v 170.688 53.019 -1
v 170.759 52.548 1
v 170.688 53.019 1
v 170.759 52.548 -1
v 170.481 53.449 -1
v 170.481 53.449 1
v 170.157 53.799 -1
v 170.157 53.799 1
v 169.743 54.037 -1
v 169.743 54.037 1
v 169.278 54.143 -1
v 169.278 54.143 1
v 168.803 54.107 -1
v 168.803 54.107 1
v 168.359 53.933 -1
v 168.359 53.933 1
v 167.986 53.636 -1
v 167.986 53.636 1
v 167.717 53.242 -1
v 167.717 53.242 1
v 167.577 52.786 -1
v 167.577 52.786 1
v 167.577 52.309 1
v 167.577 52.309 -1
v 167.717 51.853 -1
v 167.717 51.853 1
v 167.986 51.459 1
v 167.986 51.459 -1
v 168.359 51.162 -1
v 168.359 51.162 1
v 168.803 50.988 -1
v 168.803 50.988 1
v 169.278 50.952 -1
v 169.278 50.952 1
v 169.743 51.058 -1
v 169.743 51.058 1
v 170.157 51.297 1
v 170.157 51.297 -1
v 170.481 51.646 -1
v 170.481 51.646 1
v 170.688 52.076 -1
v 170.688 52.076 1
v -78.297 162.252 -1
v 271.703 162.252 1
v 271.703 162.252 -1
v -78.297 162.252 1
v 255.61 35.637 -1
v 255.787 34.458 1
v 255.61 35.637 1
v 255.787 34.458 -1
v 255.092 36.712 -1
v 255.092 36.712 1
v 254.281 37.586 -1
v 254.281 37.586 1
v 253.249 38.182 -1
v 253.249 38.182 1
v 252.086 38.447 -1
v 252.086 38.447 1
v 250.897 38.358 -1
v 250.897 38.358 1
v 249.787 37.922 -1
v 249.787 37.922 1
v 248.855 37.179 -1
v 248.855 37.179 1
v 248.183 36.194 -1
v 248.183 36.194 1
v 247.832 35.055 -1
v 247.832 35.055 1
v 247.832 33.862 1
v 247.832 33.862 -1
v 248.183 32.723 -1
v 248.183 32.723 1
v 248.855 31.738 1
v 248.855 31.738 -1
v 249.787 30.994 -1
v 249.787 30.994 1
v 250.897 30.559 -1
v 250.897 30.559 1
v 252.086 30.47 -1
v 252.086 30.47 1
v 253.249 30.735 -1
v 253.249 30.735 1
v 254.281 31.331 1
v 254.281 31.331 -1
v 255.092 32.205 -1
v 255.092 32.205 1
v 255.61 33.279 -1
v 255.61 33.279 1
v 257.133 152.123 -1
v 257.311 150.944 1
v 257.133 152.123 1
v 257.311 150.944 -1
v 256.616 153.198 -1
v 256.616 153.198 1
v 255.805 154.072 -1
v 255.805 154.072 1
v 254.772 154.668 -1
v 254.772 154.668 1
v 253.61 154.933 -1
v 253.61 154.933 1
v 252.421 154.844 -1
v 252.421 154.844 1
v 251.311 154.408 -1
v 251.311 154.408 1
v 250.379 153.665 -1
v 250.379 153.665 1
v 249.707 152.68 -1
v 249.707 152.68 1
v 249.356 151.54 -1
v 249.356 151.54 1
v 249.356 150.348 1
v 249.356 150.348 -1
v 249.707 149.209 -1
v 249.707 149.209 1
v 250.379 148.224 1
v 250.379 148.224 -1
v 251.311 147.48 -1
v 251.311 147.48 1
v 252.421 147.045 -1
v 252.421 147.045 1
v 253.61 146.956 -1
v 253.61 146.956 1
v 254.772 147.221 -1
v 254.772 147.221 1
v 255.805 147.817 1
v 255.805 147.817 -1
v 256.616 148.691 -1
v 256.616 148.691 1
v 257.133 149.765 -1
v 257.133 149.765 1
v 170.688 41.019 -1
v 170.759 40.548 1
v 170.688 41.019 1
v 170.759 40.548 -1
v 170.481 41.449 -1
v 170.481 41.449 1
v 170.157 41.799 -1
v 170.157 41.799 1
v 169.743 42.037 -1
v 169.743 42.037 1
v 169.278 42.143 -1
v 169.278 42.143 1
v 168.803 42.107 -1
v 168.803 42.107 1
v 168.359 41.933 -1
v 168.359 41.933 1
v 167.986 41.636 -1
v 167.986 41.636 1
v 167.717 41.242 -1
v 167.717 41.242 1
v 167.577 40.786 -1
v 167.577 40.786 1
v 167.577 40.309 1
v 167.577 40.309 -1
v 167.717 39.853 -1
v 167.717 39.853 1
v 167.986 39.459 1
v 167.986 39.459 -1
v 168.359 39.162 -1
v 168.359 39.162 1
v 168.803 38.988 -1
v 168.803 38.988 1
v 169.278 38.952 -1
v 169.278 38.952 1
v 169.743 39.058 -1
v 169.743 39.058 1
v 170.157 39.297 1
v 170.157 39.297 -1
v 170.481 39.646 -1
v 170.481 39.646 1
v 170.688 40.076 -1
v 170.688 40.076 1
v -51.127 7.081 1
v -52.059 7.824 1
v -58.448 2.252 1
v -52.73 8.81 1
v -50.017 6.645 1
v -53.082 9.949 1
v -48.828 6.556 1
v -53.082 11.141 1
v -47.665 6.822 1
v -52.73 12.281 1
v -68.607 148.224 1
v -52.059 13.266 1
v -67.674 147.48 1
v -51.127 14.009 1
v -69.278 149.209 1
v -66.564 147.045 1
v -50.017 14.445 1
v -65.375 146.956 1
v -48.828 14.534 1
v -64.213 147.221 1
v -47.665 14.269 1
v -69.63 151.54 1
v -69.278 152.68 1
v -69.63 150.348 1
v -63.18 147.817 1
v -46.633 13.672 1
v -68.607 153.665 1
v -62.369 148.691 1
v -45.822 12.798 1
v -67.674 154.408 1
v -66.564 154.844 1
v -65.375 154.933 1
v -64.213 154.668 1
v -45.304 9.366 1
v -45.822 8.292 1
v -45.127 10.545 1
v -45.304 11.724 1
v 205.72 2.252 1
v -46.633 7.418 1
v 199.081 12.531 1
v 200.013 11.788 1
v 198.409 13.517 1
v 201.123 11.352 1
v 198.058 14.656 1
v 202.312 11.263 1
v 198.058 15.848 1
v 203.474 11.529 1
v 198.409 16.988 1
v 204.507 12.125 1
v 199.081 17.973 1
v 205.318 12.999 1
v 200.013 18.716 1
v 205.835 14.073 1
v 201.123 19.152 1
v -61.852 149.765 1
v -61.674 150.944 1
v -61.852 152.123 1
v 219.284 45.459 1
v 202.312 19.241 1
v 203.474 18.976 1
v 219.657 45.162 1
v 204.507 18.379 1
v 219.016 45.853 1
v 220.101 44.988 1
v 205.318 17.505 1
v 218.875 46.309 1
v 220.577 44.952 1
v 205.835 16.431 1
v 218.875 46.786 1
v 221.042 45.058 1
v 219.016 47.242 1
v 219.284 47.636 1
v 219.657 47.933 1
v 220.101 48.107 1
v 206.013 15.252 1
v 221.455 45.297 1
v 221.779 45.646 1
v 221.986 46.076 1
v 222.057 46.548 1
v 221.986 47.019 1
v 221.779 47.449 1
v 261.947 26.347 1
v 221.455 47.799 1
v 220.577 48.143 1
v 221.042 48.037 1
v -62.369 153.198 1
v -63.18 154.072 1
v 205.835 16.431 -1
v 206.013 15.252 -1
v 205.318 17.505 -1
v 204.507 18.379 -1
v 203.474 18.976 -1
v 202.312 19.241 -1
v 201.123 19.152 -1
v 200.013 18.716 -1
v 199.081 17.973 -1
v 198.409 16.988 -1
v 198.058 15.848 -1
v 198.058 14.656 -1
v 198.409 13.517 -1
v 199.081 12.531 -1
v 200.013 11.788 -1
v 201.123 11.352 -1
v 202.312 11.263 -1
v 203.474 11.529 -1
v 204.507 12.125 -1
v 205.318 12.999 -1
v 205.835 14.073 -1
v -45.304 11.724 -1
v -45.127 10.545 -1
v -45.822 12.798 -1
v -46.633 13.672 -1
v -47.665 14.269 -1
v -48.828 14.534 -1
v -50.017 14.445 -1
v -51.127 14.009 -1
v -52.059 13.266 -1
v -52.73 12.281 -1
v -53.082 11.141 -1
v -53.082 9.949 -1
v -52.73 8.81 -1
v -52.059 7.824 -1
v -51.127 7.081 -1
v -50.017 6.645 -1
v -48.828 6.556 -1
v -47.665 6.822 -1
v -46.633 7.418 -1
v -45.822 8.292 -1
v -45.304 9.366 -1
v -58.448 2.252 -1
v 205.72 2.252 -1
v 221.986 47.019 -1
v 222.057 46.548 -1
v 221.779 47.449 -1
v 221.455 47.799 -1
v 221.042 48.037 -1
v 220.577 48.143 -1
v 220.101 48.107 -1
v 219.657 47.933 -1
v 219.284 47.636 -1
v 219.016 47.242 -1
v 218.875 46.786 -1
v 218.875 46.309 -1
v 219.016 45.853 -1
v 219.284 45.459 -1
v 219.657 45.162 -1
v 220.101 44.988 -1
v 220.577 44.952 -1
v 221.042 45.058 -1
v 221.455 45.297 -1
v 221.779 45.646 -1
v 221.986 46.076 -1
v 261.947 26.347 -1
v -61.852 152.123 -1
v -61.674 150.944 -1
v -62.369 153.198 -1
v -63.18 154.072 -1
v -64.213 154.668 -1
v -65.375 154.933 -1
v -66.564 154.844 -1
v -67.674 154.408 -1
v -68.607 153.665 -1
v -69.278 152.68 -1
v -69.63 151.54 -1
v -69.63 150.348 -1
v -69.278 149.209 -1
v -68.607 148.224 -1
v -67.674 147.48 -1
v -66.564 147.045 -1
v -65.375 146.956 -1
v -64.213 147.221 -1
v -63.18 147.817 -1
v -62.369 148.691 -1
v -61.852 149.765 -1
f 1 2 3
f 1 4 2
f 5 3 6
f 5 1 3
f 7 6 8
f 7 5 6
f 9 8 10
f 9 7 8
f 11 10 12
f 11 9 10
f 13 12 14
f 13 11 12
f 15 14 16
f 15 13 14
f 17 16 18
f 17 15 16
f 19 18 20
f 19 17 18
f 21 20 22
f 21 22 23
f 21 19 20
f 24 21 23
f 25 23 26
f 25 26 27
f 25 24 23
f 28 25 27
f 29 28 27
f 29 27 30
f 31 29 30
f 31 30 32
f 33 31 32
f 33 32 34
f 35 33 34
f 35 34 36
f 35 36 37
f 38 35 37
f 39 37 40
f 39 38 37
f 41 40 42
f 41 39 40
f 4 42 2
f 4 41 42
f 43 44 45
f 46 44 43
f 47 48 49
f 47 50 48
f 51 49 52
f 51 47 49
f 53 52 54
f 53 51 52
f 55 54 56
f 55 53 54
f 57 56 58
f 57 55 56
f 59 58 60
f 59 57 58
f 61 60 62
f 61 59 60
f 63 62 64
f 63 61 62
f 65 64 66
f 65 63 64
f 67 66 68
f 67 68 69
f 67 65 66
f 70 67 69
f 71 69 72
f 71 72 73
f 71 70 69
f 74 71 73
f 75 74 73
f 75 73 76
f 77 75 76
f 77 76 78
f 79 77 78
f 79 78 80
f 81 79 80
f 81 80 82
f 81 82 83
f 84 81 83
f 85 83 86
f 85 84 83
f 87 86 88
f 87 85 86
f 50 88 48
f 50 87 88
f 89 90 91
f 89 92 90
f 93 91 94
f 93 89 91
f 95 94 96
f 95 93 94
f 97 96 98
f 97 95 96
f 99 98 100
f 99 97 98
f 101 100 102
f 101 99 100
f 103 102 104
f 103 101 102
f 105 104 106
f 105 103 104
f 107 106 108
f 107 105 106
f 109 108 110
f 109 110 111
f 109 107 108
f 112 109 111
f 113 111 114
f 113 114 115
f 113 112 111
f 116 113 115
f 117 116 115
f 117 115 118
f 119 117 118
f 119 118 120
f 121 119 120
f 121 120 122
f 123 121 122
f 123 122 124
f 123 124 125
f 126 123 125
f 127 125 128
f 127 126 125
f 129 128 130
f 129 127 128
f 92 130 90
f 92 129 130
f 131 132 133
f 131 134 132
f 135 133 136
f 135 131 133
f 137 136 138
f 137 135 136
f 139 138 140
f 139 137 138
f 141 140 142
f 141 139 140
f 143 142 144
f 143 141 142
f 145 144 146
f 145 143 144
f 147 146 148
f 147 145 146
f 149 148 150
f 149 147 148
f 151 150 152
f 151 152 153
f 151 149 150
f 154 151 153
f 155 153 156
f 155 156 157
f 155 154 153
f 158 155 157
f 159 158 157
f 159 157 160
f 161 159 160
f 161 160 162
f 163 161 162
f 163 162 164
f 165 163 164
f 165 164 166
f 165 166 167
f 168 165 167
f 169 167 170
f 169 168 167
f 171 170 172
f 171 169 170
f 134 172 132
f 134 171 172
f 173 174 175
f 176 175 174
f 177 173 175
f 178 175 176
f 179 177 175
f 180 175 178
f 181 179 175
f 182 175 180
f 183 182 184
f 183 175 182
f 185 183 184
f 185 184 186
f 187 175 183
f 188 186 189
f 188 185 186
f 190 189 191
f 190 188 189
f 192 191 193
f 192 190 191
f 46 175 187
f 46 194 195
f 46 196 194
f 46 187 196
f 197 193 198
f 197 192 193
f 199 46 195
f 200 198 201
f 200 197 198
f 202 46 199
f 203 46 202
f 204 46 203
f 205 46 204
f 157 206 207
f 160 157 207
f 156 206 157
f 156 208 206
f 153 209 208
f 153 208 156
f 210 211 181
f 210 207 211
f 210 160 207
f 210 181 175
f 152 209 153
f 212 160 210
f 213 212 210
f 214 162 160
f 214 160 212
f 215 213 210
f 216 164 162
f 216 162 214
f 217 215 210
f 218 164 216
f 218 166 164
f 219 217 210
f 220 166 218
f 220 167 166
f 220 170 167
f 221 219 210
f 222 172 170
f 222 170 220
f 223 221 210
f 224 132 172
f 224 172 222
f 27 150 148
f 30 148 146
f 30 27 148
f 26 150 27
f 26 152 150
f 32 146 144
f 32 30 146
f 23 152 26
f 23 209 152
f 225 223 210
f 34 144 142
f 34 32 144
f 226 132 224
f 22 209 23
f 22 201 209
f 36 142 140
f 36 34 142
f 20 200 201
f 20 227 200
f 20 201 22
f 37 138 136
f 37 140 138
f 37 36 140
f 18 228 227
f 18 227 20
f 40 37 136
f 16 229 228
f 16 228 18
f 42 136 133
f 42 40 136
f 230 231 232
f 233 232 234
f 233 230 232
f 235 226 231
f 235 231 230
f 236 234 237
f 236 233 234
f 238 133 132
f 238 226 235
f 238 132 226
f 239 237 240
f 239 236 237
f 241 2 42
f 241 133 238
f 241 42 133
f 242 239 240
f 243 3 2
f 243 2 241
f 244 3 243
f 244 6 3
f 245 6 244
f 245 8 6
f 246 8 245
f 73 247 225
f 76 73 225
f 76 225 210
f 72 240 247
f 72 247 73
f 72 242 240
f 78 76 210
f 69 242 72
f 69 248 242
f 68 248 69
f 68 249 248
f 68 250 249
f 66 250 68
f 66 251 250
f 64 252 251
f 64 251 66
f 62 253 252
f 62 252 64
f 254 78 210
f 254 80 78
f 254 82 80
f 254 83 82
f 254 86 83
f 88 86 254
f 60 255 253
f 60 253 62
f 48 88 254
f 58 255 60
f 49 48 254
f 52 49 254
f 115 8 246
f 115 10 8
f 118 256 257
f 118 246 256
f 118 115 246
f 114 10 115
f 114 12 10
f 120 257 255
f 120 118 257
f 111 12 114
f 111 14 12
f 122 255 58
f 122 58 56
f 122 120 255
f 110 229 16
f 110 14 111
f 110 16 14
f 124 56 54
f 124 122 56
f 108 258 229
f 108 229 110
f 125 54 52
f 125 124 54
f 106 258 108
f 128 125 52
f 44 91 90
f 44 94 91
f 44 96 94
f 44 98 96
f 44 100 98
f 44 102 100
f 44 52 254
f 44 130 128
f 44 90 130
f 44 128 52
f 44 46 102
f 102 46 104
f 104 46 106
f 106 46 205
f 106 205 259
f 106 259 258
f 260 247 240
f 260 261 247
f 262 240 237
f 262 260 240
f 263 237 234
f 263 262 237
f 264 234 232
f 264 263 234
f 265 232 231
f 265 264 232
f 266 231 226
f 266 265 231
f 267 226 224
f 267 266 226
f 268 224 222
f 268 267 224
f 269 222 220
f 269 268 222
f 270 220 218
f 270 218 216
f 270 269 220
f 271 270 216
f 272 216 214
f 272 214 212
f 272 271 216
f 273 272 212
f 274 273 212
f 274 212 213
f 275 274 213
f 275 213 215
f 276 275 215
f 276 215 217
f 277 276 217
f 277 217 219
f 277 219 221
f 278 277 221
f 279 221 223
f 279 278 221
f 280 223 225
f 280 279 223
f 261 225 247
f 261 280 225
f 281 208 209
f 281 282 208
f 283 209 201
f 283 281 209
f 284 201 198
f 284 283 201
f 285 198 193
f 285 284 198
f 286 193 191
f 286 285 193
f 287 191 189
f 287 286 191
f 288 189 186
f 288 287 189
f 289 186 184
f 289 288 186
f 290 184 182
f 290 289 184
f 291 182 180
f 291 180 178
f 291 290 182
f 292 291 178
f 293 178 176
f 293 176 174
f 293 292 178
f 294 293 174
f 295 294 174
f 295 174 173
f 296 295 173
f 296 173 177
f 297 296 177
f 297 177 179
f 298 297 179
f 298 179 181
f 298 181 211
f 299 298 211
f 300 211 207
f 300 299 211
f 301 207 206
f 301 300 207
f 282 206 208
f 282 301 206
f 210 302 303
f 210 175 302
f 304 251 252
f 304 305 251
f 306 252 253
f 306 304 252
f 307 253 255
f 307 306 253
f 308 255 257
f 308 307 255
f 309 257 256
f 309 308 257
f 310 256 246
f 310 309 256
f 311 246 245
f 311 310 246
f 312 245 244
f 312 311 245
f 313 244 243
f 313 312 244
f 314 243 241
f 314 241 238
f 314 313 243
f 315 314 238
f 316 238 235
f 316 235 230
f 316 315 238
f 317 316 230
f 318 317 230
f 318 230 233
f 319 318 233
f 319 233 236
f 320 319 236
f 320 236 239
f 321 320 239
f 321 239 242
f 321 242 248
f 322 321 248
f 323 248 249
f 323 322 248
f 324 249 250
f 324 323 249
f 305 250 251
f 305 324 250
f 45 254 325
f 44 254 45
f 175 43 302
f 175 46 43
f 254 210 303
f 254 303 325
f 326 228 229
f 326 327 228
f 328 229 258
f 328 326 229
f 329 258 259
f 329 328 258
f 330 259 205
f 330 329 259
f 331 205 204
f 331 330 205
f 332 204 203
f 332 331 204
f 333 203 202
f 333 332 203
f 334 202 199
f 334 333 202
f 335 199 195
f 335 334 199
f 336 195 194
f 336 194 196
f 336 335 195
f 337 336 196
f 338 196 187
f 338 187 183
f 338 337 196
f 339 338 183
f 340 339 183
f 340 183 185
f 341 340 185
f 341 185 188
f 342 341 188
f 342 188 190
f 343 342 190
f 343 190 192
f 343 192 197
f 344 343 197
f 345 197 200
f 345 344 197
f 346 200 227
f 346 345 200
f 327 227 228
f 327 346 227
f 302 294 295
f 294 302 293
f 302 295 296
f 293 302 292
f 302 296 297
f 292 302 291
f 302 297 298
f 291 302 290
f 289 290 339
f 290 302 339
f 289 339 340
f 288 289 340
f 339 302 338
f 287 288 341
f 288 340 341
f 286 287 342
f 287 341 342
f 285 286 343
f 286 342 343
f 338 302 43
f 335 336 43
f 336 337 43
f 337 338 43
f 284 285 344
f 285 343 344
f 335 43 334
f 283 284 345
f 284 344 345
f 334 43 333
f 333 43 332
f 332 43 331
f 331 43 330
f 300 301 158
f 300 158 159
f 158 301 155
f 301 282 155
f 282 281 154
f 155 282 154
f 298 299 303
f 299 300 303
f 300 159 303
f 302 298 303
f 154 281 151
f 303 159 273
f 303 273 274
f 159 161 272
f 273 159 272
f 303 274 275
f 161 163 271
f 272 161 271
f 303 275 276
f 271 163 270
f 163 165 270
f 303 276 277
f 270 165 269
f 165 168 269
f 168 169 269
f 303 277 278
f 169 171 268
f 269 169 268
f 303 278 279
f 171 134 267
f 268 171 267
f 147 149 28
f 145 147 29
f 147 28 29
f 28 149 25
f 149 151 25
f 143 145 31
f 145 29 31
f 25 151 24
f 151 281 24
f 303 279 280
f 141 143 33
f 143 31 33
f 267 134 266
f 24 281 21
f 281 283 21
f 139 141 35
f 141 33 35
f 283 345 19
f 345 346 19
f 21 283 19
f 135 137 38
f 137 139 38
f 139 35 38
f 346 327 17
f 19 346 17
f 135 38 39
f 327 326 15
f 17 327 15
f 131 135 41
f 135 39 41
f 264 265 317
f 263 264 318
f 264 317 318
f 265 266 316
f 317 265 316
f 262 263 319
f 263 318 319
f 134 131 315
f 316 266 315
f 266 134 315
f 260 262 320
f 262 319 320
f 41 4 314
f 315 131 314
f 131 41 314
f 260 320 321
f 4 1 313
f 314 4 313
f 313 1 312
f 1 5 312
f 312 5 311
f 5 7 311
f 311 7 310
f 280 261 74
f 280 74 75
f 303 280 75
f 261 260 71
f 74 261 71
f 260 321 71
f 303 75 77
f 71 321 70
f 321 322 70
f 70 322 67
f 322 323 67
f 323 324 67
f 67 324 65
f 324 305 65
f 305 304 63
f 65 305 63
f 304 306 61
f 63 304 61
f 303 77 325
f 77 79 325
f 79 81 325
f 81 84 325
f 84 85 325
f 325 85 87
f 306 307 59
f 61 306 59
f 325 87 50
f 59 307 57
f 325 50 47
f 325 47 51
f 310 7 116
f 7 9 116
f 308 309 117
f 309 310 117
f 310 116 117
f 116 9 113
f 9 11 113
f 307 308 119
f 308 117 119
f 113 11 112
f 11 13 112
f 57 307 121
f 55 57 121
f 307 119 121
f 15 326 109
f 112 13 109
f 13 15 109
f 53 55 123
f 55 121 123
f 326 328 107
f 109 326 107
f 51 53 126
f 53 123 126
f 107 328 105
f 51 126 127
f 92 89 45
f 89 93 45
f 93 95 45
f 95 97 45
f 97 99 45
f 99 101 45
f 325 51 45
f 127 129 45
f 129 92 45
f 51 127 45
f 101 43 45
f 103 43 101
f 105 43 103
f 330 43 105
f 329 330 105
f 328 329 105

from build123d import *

# Parameters (mm, degrees)
SKETCH1_R           = 1.6
SKETCH1_R_2         = 4
BOSS_EXTRUDE1_DEPTH = 1


with BuildPart() as part:
    # Sketch1 → Boss-Extrude1 (new body, symmetric)
    with BuildSketch(Plane.XY):
        Polygon((-58.447822699, 2.25215401), (205.719516193, 2.25215401), (261.946581062, 26.347260557), (271.703456729, 162.25215401), (-78.296543271, 162.25215401), align=None)
        with Locations((169.158925411, 40.547600357)):
            Circle(SKETCH1_R, mode=Mode.SUBTRACT)
        with Locations((169.158925411, 52.547600357)):
            Circle(SKETCH1_R, mode=Mode.SUBTRACT)
        with Locations((220.457146693, 46.547600357)):
            Circle(SKETCH1_R, mode=Mode.SUBTRACT)
        with Locations((-65.674373942, 150.94432728)):
            Circle(SKETCH1_R_2, mode=Mode.SUBTRACT)
        with Locations((253.311068017, 150.94432728)):
            Circle(SKETCH1_R_2, mode=Mode.SUBTRACT)
        with Locations((251.787322425, 34.458331013)):
            Circle(SKETCH1_R_2, mode=Mode.SUBTRACT)
        with Locations((202.012846736, 15.25215401)):
            Circle(SKETCH1_R_2, mode=Mode.SUBTRACT)
        with Locations((-49.126516792, 10.545043982)):
            Circle(SKETCH1_R_2, mode=Mode.SUBTRACT)
    extrude(amount=BOSS_EXTRUDE1_DEPTH, both=True)


solid = part.part
